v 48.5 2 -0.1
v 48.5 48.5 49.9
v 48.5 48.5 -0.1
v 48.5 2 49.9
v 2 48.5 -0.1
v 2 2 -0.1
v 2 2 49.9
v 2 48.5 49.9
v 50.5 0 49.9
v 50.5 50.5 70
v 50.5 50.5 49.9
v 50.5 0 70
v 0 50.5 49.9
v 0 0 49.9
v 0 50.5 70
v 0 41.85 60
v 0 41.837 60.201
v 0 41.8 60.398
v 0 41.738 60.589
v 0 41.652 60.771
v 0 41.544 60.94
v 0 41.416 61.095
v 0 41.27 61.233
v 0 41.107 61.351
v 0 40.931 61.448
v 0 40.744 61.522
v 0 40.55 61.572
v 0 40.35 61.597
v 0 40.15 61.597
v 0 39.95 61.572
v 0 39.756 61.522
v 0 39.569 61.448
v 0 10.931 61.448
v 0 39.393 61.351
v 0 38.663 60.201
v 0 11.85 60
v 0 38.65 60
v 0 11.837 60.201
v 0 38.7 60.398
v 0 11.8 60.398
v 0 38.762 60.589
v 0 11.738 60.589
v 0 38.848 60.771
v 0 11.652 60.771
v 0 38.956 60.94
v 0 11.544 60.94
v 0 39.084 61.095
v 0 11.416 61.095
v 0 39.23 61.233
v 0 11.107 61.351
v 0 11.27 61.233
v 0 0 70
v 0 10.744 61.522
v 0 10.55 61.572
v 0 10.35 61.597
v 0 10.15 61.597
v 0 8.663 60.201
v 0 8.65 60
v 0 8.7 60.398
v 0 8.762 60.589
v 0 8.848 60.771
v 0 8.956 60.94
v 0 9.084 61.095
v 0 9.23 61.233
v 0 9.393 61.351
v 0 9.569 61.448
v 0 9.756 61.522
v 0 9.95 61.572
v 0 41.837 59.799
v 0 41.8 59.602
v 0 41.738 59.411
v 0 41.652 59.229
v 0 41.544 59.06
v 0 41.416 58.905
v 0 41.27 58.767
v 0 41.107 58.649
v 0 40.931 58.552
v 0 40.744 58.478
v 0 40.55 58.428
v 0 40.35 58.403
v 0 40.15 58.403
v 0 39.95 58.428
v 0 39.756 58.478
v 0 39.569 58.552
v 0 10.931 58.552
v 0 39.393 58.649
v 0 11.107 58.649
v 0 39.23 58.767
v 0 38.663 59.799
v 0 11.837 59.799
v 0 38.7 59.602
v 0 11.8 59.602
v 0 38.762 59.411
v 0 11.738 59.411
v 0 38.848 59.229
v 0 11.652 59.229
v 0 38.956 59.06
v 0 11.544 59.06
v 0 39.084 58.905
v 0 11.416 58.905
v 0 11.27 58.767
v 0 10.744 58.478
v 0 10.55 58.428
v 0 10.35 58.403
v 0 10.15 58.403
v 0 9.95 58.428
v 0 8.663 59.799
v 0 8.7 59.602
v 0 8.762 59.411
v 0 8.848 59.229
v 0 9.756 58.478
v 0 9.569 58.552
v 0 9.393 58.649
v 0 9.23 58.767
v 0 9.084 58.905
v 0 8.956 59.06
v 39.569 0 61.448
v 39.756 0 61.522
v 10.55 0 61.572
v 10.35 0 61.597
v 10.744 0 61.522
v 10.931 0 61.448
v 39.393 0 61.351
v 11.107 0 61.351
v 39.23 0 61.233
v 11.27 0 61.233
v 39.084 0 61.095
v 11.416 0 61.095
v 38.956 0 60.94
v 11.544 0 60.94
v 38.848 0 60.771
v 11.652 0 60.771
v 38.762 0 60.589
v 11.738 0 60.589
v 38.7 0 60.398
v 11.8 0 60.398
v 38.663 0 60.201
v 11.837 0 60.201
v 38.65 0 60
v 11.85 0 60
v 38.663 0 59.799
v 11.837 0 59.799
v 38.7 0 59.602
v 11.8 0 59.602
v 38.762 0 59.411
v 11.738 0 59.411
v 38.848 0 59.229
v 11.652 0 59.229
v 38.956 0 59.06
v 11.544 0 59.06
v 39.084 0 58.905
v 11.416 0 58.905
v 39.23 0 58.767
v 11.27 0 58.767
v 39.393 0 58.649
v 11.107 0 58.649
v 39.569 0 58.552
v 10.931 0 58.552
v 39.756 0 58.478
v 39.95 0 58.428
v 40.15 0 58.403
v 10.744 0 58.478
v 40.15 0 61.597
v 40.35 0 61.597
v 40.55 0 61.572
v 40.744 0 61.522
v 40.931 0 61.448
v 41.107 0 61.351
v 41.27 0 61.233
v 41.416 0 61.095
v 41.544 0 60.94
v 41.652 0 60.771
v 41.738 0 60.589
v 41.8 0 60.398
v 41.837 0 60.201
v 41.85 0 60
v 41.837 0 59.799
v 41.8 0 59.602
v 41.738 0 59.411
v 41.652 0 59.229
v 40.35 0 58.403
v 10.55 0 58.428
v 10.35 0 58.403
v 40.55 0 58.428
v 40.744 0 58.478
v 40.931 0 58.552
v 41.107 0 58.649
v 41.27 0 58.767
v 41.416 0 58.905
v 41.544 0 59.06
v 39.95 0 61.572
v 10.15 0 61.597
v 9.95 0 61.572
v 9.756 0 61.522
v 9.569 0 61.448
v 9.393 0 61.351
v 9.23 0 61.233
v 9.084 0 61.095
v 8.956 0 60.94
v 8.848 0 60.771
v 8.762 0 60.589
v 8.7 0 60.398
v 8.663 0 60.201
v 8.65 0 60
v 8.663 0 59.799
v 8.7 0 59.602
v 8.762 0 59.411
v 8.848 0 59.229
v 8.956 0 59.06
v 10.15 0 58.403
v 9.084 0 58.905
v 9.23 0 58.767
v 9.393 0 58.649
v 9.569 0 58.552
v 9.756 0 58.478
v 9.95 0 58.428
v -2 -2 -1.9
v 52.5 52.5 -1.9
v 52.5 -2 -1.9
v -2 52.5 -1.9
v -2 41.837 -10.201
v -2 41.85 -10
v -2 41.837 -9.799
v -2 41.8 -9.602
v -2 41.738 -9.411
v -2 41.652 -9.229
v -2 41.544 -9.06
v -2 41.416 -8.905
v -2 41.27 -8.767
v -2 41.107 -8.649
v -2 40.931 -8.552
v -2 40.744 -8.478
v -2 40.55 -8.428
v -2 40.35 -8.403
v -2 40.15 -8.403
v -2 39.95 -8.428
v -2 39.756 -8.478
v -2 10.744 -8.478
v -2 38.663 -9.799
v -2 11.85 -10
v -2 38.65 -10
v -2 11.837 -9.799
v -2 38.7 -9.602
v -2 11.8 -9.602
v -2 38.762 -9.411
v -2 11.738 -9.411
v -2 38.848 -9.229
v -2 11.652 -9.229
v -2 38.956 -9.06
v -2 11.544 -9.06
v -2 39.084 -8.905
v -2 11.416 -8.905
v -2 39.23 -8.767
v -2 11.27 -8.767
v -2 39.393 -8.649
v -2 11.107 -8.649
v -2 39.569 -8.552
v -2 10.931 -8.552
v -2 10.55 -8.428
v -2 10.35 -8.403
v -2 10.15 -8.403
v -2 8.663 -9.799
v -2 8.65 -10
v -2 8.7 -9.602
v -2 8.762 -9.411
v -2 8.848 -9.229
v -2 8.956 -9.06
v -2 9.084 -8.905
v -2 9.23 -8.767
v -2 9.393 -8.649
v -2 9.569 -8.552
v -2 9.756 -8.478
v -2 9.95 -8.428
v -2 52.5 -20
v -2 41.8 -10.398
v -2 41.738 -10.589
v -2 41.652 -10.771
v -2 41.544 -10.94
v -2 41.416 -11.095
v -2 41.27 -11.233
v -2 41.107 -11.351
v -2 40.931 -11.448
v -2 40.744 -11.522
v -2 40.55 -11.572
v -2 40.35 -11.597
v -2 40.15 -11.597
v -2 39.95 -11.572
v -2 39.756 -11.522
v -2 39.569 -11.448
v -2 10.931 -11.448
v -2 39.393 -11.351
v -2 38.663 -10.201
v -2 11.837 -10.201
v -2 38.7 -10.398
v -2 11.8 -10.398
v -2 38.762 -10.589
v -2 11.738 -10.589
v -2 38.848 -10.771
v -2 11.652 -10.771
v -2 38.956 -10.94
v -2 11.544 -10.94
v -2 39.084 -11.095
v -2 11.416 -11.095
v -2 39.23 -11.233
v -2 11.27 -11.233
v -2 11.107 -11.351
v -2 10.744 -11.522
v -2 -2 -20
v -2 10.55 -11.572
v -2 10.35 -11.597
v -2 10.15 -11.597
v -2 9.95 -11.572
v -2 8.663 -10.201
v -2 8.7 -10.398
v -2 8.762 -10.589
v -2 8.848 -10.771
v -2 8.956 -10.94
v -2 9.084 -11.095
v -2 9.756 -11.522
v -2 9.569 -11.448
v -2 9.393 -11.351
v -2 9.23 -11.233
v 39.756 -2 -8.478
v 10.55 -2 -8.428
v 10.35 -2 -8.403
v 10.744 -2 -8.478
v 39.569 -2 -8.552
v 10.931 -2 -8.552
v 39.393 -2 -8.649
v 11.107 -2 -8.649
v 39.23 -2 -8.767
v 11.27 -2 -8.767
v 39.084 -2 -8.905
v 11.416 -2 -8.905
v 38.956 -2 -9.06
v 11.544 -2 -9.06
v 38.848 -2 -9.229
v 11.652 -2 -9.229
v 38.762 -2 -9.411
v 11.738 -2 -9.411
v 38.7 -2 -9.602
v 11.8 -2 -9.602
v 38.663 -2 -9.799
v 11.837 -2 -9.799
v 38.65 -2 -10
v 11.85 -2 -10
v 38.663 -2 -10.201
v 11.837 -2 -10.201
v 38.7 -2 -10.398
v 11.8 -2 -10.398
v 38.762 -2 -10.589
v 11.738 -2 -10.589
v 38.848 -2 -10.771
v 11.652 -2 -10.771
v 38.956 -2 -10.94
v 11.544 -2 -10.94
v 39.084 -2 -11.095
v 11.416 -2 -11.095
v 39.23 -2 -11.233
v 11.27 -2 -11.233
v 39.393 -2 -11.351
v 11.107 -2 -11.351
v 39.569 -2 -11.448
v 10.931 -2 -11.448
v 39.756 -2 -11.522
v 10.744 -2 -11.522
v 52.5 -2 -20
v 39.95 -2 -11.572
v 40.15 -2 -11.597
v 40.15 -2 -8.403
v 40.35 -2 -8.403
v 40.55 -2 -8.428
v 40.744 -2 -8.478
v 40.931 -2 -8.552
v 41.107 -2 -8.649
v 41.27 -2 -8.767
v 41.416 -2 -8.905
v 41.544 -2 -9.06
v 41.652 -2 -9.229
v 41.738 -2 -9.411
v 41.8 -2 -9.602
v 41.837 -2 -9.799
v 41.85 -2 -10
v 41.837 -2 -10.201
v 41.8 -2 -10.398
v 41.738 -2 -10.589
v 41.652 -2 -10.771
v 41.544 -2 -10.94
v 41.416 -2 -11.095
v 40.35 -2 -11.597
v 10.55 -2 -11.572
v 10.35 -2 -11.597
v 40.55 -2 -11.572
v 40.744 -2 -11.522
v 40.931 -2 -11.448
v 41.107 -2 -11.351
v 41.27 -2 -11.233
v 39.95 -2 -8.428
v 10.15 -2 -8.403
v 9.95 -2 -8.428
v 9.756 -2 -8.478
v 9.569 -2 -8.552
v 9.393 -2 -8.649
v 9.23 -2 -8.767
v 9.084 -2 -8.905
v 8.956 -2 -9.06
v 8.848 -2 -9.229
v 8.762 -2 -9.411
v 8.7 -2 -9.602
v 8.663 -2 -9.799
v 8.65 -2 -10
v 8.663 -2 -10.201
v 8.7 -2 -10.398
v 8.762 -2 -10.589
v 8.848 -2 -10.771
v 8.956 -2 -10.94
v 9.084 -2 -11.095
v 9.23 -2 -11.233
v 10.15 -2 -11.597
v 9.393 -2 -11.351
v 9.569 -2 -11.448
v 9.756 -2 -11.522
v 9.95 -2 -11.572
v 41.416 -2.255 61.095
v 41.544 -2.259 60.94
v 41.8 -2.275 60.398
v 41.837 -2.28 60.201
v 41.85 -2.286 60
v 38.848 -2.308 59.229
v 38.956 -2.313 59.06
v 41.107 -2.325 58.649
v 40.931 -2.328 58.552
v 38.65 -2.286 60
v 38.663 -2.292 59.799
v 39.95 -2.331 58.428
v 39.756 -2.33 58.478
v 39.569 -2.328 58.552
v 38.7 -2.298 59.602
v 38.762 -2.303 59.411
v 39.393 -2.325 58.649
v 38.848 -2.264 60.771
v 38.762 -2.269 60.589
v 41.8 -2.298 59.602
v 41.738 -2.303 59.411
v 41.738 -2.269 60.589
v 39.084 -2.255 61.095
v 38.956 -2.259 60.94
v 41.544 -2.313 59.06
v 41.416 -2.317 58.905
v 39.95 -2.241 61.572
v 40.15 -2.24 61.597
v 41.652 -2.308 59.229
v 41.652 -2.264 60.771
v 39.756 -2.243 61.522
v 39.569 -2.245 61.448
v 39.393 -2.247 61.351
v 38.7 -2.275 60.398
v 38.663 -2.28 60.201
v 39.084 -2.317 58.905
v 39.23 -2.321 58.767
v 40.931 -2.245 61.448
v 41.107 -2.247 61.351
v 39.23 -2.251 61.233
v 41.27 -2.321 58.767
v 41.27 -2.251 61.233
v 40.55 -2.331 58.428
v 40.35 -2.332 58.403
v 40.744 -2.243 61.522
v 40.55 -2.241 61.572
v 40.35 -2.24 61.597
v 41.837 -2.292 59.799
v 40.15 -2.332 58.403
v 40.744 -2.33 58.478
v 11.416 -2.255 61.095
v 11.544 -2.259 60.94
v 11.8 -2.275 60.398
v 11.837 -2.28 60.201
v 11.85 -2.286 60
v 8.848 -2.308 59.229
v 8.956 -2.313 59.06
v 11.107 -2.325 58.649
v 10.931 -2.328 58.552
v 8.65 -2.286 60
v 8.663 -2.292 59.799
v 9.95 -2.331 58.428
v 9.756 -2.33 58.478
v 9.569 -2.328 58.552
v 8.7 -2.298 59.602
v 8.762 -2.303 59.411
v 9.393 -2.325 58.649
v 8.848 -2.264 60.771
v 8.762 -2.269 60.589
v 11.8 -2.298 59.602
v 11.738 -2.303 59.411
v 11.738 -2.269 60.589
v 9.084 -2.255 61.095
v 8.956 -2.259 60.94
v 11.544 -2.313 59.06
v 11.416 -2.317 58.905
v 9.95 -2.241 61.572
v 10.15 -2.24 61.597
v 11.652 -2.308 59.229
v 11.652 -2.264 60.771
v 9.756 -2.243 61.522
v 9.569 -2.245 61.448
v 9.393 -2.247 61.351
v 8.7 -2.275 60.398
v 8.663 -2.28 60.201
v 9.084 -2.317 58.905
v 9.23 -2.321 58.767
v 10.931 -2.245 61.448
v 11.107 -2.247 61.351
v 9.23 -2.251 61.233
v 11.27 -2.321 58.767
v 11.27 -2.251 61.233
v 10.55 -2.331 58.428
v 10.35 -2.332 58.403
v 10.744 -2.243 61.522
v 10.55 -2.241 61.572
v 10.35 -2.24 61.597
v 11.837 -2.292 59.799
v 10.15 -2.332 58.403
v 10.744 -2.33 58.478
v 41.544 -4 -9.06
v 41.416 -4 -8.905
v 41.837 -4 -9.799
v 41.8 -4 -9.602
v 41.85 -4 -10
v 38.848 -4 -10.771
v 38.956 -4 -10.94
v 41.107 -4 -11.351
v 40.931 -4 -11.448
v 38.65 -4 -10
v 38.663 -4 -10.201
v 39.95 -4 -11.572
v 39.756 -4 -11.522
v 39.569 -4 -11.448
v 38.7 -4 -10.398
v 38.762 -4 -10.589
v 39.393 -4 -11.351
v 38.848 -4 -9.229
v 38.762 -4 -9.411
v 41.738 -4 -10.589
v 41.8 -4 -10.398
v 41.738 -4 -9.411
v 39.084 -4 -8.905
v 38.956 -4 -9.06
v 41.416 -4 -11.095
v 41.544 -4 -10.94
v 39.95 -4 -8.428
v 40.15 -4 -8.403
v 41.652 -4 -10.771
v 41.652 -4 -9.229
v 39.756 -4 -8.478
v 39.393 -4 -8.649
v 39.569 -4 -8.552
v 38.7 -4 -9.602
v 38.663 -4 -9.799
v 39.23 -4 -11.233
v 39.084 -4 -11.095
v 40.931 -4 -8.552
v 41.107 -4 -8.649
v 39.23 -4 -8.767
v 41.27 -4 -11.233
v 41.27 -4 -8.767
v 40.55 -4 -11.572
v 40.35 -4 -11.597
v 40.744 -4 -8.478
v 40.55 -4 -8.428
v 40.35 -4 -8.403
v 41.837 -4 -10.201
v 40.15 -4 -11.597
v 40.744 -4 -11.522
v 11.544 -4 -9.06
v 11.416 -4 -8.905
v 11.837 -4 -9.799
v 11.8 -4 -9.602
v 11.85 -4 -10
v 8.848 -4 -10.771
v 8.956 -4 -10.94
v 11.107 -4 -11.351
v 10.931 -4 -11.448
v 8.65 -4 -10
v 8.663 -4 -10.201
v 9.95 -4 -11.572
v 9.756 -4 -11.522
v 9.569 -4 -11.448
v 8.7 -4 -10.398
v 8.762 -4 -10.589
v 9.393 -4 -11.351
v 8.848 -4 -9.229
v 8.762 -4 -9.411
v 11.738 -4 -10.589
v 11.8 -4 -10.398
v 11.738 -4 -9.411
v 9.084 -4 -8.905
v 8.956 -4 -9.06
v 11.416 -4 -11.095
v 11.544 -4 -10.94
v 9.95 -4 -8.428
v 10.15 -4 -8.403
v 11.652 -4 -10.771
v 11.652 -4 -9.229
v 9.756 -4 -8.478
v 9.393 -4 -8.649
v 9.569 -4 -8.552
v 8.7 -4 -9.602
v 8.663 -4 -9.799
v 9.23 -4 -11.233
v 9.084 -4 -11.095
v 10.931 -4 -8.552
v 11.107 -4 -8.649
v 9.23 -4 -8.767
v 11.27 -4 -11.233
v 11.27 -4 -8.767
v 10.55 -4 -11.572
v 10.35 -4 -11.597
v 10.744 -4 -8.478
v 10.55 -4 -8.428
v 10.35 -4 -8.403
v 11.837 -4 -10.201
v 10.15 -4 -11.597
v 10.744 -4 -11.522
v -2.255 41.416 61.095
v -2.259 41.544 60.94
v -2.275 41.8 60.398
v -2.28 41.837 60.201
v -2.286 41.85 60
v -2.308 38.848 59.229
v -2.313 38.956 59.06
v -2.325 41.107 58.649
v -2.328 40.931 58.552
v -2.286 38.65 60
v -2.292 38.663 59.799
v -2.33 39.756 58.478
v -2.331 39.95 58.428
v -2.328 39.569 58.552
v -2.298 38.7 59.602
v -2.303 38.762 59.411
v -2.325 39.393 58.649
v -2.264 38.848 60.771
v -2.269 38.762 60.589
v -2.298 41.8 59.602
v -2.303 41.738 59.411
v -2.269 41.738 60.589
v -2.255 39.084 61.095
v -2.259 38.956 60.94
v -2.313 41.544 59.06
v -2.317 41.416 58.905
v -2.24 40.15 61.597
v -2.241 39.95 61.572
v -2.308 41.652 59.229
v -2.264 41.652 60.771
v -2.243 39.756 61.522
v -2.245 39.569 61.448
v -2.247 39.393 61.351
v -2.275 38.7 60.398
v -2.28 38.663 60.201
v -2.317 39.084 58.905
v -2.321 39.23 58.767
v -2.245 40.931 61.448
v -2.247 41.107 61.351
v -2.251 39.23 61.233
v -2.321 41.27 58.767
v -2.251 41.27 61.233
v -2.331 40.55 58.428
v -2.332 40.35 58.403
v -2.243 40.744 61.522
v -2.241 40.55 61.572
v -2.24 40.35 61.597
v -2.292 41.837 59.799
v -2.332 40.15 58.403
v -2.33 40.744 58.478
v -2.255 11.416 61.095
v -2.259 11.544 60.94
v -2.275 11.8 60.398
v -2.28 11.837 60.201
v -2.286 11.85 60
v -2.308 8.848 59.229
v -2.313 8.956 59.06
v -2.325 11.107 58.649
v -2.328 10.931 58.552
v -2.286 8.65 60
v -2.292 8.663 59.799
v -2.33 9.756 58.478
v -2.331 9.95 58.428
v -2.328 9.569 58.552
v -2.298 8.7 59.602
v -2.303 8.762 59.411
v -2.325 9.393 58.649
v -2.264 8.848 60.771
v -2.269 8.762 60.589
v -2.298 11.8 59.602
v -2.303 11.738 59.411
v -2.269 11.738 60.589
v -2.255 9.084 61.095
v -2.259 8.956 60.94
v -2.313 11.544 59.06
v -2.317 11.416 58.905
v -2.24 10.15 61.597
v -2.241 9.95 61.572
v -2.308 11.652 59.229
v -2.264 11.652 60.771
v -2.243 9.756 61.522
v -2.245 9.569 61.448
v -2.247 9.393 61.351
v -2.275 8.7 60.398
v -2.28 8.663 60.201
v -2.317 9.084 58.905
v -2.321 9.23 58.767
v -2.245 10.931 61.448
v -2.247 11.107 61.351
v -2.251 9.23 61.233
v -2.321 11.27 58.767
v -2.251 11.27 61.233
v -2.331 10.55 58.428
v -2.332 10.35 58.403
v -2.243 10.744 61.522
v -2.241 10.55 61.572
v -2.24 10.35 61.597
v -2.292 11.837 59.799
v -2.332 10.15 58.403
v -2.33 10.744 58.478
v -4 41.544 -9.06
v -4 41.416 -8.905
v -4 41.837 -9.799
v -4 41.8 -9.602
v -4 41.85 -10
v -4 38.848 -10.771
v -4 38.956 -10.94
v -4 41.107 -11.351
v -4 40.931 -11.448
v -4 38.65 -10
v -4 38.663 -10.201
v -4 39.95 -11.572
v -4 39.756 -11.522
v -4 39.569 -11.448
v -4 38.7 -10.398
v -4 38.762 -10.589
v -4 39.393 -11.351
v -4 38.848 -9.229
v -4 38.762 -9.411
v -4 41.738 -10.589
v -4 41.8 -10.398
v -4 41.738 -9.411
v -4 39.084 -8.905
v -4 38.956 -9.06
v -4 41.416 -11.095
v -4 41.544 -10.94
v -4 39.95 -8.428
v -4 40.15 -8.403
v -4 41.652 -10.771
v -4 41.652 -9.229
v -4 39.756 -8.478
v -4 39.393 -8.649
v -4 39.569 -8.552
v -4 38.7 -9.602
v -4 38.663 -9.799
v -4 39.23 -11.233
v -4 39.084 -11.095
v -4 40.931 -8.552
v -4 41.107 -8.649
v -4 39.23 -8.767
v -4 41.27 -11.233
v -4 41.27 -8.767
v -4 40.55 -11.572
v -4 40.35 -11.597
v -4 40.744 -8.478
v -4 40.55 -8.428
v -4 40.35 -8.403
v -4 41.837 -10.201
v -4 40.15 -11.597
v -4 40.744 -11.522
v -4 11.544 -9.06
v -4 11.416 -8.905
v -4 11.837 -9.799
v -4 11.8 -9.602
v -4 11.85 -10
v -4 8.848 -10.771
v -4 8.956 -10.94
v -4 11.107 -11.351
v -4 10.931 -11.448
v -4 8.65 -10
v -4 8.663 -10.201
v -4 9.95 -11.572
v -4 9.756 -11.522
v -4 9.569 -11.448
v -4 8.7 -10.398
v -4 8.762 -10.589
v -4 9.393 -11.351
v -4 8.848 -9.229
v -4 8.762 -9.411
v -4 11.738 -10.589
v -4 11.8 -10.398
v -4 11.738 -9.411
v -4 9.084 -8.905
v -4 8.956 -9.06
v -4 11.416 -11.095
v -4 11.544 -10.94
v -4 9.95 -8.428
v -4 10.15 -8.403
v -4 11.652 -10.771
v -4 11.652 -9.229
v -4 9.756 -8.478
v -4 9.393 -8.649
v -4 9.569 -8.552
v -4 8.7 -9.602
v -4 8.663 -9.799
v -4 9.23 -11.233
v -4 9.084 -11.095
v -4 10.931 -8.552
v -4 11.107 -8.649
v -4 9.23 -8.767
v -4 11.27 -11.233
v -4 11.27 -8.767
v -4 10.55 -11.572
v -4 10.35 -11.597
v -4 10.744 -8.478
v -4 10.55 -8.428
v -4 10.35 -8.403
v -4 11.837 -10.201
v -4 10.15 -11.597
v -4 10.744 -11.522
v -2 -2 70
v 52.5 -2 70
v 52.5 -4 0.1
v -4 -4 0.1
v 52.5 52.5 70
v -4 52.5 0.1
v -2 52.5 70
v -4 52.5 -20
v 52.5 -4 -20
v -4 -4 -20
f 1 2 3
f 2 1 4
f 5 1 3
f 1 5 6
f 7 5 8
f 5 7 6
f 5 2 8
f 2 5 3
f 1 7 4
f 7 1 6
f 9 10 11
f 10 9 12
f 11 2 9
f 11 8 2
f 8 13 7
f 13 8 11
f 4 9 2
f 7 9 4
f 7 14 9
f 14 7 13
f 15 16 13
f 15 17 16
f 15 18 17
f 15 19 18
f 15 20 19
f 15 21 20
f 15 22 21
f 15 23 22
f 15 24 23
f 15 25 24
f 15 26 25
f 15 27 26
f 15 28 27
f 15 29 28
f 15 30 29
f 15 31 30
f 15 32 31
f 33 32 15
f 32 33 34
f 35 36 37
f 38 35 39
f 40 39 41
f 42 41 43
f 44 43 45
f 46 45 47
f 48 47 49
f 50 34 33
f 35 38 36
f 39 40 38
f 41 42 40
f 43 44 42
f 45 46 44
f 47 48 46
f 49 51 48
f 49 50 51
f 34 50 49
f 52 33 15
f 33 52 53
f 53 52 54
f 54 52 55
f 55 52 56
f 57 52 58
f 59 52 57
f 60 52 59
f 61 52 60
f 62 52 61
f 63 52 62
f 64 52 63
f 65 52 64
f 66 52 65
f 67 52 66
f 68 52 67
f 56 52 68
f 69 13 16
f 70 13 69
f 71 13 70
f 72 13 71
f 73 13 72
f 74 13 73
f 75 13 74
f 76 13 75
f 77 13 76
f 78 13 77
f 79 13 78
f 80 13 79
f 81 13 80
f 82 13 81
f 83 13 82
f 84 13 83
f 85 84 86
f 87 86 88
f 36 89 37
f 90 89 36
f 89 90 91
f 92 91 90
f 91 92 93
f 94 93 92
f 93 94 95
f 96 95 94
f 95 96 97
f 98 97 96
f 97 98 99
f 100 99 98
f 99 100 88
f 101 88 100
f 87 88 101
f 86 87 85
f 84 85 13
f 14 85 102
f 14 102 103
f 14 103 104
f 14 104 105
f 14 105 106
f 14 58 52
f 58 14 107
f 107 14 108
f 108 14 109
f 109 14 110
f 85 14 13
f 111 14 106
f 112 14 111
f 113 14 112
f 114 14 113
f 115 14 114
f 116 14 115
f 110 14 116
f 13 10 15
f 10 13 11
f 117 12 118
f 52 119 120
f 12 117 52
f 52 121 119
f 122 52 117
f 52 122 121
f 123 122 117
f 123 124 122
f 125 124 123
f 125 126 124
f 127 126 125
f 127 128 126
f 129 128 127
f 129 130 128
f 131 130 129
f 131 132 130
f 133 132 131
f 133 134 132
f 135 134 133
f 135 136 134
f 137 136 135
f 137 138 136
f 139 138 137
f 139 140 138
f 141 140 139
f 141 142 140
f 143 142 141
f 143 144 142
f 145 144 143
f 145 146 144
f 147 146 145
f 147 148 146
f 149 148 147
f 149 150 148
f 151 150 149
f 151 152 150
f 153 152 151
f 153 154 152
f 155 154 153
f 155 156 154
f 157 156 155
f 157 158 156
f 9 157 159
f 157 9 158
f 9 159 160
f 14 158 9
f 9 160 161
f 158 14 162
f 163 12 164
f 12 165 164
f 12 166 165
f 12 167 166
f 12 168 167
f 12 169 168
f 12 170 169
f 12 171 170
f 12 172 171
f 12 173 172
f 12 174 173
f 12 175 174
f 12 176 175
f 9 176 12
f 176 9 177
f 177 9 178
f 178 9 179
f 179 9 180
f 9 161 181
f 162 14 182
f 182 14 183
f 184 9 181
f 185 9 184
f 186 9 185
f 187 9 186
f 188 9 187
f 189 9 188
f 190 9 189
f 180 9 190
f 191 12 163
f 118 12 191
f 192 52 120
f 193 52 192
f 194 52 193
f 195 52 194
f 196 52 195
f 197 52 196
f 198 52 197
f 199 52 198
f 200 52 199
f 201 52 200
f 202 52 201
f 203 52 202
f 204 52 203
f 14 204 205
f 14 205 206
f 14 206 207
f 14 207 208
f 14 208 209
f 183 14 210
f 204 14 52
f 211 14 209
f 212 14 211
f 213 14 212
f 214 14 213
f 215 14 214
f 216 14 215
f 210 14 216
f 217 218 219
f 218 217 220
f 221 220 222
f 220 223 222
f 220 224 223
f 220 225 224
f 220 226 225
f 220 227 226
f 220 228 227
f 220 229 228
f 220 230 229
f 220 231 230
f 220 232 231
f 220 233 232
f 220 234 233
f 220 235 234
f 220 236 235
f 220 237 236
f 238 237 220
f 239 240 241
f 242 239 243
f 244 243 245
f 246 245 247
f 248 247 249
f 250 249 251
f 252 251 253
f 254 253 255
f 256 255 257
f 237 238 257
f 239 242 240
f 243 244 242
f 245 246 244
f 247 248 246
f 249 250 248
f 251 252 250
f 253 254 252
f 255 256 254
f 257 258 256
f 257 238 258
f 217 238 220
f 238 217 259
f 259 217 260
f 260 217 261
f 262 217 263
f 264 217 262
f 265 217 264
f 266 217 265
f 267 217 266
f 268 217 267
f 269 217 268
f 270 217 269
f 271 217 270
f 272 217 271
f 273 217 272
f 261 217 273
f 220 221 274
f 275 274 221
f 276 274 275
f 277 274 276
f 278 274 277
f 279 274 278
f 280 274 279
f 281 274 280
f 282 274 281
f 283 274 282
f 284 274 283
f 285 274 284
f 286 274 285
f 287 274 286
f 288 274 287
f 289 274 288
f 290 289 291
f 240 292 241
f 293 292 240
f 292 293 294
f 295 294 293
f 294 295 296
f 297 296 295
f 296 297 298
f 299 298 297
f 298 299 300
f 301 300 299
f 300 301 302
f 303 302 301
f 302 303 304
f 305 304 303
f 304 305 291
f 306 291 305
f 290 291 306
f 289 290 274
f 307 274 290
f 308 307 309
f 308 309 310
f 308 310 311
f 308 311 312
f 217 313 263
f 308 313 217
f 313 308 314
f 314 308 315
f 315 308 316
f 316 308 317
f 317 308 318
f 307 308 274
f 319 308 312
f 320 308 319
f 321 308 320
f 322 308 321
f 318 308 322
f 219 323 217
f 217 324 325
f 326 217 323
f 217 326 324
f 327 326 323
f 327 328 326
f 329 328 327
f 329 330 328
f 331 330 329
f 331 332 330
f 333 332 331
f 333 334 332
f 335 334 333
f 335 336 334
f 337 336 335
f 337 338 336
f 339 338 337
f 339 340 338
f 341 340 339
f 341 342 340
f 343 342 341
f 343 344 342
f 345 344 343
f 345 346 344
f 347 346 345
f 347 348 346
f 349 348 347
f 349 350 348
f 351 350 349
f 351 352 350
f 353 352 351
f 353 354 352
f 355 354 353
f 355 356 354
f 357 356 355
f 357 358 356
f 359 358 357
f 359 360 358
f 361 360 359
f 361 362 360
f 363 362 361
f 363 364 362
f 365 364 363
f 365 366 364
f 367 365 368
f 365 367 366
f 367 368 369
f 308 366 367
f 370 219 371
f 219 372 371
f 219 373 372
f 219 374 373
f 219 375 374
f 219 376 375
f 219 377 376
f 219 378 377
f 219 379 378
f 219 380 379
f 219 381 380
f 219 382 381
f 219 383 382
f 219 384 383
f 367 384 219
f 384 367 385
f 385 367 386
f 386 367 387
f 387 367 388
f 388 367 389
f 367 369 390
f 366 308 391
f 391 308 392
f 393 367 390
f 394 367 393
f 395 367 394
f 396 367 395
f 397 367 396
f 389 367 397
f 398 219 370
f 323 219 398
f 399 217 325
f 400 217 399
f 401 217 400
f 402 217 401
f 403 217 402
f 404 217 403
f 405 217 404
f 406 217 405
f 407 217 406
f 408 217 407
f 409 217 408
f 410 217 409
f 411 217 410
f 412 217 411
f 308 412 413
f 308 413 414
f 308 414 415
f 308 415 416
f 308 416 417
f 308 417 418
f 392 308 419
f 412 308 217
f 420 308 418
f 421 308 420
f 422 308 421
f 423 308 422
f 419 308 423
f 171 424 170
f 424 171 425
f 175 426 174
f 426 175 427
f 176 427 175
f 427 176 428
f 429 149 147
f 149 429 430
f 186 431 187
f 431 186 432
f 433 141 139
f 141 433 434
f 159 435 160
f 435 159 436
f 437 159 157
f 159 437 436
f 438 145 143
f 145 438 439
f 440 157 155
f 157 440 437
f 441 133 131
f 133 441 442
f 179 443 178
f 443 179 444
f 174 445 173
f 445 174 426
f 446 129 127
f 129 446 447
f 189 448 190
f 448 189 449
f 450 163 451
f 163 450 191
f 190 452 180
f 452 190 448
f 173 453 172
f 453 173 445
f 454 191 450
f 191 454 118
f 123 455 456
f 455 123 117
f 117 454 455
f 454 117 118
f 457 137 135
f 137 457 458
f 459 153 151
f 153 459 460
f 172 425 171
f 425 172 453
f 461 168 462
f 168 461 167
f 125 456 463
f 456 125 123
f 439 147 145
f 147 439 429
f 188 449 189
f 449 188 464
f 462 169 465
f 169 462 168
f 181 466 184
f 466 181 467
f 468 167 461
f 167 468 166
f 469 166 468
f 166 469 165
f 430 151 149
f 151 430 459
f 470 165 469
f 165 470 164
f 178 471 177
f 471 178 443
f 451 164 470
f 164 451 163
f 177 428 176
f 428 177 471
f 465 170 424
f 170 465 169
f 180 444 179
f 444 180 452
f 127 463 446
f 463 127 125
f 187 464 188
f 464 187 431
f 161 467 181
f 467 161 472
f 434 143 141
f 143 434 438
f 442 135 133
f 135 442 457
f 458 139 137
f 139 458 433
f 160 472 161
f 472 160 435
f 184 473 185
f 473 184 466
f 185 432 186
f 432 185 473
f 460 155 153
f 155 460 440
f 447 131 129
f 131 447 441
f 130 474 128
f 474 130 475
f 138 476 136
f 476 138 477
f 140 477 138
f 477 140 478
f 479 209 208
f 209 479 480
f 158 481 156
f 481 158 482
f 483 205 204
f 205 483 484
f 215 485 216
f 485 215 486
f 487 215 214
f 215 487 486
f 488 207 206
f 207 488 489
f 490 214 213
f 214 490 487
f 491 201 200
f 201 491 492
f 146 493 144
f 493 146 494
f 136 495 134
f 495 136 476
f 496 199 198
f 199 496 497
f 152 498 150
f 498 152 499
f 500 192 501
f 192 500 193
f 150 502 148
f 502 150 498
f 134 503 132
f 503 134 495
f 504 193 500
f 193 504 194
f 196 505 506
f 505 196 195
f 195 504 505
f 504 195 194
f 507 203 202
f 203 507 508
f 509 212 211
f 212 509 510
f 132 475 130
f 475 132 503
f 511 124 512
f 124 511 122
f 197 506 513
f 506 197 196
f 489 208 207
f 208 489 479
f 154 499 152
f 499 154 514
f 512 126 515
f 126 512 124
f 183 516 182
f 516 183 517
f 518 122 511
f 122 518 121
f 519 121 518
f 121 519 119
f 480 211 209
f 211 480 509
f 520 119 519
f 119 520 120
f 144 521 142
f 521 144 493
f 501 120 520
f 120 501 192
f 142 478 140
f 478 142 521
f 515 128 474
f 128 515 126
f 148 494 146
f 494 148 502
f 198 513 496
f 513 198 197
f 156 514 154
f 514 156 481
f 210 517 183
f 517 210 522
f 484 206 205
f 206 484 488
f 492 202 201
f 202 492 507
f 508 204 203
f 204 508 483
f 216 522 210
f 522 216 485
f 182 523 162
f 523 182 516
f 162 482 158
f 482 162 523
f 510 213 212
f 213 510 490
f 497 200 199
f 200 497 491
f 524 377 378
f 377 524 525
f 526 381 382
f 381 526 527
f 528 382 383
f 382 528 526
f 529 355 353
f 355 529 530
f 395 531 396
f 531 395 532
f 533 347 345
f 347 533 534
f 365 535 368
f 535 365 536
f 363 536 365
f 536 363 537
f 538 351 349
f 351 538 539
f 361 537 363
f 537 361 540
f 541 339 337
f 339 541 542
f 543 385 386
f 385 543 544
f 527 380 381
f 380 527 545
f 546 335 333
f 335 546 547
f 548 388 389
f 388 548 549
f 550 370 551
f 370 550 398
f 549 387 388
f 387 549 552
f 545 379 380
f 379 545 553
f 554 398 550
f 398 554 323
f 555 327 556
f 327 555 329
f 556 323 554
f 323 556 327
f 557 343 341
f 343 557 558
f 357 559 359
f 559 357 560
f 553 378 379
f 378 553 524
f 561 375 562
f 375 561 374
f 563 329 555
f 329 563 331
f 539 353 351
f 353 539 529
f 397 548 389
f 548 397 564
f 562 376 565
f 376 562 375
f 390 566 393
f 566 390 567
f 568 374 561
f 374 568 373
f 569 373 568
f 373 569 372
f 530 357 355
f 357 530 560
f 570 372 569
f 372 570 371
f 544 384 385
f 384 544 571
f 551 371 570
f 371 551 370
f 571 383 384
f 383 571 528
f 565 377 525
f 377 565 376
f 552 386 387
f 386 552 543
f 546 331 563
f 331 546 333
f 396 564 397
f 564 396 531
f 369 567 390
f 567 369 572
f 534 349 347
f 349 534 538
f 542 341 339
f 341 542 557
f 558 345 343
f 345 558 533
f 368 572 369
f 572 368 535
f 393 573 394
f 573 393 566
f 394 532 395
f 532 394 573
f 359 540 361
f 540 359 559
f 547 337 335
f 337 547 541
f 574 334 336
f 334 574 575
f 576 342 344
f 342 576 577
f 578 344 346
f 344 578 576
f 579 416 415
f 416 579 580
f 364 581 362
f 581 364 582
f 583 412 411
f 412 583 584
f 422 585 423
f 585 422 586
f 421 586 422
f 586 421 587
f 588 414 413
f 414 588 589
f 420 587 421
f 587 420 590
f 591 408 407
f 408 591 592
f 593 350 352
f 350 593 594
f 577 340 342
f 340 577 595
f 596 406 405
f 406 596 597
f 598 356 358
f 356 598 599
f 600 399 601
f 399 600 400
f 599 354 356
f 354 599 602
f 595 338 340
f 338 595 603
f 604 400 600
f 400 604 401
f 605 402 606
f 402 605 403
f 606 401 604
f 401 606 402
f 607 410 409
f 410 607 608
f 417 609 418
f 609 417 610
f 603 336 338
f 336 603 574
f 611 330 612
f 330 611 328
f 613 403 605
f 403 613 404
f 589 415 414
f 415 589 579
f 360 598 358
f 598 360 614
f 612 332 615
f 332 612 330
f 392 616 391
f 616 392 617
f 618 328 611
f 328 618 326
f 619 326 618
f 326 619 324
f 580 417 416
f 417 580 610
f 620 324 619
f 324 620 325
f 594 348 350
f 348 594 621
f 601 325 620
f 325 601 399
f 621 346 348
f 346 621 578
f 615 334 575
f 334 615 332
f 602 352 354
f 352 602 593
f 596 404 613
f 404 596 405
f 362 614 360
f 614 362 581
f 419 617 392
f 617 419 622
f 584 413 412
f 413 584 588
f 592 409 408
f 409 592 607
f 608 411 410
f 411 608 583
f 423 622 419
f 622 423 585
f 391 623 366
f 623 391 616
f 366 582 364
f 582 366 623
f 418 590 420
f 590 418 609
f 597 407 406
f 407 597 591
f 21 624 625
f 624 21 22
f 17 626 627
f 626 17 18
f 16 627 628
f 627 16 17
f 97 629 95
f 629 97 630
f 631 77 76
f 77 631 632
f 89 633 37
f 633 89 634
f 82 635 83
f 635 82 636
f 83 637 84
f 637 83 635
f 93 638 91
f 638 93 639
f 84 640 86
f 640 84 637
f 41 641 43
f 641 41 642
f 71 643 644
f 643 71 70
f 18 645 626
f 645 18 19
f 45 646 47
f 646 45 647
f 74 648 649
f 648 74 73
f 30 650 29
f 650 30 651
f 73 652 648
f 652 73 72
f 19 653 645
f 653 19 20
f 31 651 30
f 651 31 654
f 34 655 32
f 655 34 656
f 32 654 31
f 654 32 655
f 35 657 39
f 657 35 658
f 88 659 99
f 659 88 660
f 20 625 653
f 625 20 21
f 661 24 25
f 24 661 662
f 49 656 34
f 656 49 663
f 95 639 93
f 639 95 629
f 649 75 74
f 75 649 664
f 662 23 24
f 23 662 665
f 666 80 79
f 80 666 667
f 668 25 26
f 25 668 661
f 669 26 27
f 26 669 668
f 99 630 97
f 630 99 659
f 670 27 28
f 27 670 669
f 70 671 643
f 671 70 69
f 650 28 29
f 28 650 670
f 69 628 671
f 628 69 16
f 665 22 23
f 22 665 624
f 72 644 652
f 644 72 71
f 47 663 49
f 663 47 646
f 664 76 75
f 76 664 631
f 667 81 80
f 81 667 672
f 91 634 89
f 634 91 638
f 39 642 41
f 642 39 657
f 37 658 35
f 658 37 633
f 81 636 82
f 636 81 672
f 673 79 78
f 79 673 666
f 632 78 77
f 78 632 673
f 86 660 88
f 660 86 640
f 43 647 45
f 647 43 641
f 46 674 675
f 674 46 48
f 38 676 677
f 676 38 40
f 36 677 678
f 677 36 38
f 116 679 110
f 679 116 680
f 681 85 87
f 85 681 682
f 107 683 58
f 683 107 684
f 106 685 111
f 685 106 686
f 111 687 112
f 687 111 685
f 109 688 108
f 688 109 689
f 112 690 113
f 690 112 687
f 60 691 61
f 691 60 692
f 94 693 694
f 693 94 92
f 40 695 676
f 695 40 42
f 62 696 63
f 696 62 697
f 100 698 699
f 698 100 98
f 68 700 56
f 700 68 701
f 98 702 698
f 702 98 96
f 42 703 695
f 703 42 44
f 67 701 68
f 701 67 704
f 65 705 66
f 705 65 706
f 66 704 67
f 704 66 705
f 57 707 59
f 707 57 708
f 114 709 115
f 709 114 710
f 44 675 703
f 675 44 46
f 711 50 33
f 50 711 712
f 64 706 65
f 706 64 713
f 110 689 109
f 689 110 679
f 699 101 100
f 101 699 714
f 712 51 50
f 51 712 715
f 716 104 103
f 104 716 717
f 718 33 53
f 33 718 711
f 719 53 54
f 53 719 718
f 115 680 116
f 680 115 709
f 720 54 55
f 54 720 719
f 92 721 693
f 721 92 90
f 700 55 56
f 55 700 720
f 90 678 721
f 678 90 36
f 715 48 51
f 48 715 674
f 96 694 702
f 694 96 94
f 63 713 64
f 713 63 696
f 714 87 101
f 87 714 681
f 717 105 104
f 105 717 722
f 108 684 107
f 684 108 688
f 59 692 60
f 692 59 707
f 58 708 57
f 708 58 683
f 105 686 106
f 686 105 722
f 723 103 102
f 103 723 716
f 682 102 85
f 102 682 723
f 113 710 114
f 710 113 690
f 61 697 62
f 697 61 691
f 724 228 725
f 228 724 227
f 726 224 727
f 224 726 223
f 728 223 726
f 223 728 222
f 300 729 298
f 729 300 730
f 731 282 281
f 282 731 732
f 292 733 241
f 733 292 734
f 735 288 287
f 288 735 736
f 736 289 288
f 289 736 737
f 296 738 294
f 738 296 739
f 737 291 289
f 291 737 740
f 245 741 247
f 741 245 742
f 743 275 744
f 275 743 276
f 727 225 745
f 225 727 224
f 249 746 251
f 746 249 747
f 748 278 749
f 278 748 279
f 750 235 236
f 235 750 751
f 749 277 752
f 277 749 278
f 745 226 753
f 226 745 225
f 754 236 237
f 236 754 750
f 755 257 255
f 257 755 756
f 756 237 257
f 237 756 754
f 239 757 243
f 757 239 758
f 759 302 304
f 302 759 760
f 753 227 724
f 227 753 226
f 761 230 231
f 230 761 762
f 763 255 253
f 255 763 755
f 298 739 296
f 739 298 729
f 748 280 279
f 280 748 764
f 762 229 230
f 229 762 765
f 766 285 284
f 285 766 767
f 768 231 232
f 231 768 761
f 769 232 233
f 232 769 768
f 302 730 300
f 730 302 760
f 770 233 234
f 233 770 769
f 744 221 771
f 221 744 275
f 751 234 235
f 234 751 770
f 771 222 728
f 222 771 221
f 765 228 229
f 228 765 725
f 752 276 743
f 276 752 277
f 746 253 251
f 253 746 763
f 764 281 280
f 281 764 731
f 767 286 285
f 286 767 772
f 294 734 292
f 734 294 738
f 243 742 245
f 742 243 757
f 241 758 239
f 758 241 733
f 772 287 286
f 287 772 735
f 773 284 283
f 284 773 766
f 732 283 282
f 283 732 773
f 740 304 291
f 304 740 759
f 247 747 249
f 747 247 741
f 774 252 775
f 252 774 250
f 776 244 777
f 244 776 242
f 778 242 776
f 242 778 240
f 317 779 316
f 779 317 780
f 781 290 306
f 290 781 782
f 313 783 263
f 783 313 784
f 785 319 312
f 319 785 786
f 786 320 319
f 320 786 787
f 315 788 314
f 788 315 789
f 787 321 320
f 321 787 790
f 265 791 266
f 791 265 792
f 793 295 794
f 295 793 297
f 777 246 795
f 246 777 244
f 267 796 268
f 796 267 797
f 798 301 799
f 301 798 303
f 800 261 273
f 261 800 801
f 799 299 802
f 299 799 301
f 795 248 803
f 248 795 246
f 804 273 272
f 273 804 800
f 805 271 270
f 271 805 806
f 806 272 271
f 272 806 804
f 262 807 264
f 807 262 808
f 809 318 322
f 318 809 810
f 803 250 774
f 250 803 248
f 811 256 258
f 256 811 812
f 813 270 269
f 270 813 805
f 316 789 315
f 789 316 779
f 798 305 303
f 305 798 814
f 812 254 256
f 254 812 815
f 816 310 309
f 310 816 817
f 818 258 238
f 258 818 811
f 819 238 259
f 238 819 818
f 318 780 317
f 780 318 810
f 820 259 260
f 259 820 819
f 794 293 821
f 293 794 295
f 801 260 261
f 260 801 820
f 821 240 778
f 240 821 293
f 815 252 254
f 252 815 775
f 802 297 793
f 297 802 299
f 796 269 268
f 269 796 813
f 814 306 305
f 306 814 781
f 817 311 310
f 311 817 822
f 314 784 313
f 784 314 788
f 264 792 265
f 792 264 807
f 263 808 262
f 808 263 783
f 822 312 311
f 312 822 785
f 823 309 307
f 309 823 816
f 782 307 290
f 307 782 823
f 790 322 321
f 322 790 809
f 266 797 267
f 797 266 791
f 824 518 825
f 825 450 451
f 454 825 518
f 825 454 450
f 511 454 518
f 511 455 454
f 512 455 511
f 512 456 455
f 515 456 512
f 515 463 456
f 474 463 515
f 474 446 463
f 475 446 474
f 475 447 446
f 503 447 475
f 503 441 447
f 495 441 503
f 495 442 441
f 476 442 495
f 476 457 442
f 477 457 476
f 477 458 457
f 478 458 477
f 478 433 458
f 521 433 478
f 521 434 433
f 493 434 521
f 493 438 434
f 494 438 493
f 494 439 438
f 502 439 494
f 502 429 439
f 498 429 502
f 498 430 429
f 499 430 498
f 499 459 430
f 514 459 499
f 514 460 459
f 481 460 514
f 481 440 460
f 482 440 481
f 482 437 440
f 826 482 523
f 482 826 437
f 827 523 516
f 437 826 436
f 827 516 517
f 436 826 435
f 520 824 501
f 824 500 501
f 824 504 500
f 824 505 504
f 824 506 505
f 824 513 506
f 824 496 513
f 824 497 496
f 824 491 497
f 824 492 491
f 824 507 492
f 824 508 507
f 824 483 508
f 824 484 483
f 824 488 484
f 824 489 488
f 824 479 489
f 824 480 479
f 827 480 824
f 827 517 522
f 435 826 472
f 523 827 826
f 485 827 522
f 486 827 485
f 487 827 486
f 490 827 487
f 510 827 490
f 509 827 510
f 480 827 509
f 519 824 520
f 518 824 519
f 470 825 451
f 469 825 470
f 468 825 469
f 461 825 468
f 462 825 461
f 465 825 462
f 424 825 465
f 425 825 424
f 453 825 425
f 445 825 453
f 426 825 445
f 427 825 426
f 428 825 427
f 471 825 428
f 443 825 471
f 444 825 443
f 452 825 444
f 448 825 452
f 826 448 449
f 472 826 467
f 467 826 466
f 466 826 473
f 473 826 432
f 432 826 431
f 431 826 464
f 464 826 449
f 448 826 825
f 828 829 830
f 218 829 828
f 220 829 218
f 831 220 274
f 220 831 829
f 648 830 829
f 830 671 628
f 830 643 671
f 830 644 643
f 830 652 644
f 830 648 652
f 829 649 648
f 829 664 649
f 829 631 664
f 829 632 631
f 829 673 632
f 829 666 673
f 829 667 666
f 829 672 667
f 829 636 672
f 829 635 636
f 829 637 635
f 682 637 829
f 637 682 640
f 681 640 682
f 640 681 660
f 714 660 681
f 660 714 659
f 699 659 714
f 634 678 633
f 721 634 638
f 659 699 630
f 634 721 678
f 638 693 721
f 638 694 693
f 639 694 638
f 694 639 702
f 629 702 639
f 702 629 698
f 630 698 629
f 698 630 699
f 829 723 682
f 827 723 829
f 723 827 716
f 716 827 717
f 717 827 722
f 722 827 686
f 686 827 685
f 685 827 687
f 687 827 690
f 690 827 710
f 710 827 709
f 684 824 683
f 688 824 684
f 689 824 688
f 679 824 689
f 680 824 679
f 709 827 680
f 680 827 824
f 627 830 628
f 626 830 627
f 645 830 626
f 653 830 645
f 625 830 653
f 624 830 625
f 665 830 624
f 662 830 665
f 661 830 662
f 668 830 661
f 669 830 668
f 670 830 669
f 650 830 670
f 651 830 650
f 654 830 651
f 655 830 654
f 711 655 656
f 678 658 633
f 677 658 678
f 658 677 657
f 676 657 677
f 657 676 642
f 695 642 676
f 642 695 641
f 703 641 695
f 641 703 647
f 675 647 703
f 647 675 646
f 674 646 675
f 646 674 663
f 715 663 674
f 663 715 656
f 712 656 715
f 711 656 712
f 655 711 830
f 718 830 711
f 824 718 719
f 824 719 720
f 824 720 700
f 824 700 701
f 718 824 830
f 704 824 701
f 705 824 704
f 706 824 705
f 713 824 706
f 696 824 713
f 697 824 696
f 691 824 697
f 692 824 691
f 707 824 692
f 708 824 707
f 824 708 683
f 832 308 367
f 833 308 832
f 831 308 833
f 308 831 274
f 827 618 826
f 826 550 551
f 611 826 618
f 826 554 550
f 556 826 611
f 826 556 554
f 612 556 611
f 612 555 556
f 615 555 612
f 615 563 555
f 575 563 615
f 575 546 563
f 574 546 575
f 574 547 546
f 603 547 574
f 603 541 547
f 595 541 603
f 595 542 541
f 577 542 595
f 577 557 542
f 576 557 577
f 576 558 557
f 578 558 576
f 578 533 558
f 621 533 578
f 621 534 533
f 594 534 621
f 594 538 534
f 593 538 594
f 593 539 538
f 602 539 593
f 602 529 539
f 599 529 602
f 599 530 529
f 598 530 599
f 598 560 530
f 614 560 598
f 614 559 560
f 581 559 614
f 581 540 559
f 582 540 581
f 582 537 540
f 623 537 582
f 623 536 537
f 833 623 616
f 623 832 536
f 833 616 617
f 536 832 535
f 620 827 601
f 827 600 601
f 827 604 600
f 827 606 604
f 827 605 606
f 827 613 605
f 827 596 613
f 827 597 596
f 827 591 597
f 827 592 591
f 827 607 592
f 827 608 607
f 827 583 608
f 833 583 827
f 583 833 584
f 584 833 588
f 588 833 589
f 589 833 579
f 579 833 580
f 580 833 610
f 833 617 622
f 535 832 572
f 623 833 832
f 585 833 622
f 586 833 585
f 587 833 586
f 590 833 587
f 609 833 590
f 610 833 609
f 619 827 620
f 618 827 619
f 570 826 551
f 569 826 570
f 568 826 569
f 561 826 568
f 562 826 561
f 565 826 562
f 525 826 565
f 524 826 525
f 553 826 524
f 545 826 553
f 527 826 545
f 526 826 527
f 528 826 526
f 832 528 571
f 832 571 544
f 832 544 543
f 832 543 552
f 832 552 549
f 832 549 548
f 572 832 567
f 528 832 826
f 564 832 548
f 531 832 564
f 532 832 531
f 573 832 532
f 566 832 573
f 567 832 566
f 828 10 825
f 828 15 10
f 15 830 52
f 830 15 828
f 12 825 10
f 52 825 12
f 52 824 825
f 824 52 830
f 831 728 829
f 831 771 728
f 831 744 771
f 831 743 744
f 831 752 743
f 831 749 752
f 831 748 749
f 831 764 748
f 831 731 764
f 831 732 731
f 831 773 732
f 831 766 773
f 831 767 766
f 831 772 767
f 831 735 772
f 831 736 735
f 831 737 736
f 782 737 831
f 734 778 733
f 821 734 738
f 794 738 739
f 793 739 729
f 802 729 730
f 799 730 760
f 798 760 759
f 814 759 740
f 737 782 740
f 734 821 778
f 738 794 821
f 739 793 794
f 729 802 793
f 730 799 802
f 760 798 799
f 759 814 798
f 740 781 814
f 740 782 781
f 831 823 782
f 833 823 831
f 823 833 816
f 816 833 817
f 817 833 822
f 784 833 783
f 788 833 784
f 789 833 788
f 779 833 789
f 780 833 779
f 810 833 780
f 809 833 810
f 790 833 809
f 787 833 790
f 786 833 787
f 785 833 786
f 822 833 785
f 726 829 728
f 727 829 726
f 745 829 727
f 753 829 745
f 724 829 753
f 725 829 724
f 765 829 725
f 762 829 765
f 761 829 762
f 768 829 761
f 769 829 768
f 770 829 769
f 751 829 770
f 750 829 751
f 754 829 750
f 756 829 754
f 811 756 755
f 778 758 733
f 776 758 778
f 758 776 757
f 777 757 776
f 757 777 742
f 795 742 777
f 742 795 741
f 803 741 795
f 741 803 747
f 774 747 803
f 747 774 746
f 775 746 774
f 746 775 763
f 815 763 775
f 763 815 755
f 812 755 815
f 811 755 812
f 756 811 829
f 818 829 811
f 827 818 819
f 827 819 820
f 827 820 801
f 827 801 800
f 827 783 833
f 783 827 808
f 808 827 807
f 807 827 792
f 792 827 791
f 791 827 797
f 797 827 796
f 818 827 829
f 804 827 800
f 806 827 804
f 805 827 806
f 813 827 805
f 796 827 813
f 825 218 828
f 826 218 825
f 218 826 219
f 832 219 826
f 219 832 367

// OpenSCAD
legd=50.5;
uph=70;
walld=2;

module mnthole() {
    translate( [legd/2+15,10,0] )
        rotate([90,0,0] )
        cylinder( r=1.6, h=20, $fn=50 );
    translate( [legd/2-15,10,0] )
        rotate([90,0,0] )
        cylinder( r=1.6, h=20, $fn=50 );
}

difference() {
    hull() {
        translate( [-walld,-walld,0] )
            cube( [legd+2*walld,legd+walld*2,uph] );
        translate( [-walld*2,-walld*2,-20] )
            cube( [legd+3*walld,legd+walld*3,20.1] );
    }
    union() {
        translate( [walld,walld,-0.1])
            cube( [legd-walld*2,legd-walld*2,uph+0.2] );
        translate( [0,0,uph-20-0.1])
            cube( [legd,legd,0.2+20] );
        translate( [-walld,-walld,-20.1] )
            cube( [legd+2*walld+0.1,legd+walld*2+0.1,20.2-walld] );
    }
    translate( [0,0,uph-10] )
        mnthole();
    translate( [0,0,-10] )
        mnthole();
    rotate( [0,0,90] ) {
        translate( [0,0,uph-10] )
            mnthole();
        translate( [0,0,-10] )
            mnthole();
    }
}
